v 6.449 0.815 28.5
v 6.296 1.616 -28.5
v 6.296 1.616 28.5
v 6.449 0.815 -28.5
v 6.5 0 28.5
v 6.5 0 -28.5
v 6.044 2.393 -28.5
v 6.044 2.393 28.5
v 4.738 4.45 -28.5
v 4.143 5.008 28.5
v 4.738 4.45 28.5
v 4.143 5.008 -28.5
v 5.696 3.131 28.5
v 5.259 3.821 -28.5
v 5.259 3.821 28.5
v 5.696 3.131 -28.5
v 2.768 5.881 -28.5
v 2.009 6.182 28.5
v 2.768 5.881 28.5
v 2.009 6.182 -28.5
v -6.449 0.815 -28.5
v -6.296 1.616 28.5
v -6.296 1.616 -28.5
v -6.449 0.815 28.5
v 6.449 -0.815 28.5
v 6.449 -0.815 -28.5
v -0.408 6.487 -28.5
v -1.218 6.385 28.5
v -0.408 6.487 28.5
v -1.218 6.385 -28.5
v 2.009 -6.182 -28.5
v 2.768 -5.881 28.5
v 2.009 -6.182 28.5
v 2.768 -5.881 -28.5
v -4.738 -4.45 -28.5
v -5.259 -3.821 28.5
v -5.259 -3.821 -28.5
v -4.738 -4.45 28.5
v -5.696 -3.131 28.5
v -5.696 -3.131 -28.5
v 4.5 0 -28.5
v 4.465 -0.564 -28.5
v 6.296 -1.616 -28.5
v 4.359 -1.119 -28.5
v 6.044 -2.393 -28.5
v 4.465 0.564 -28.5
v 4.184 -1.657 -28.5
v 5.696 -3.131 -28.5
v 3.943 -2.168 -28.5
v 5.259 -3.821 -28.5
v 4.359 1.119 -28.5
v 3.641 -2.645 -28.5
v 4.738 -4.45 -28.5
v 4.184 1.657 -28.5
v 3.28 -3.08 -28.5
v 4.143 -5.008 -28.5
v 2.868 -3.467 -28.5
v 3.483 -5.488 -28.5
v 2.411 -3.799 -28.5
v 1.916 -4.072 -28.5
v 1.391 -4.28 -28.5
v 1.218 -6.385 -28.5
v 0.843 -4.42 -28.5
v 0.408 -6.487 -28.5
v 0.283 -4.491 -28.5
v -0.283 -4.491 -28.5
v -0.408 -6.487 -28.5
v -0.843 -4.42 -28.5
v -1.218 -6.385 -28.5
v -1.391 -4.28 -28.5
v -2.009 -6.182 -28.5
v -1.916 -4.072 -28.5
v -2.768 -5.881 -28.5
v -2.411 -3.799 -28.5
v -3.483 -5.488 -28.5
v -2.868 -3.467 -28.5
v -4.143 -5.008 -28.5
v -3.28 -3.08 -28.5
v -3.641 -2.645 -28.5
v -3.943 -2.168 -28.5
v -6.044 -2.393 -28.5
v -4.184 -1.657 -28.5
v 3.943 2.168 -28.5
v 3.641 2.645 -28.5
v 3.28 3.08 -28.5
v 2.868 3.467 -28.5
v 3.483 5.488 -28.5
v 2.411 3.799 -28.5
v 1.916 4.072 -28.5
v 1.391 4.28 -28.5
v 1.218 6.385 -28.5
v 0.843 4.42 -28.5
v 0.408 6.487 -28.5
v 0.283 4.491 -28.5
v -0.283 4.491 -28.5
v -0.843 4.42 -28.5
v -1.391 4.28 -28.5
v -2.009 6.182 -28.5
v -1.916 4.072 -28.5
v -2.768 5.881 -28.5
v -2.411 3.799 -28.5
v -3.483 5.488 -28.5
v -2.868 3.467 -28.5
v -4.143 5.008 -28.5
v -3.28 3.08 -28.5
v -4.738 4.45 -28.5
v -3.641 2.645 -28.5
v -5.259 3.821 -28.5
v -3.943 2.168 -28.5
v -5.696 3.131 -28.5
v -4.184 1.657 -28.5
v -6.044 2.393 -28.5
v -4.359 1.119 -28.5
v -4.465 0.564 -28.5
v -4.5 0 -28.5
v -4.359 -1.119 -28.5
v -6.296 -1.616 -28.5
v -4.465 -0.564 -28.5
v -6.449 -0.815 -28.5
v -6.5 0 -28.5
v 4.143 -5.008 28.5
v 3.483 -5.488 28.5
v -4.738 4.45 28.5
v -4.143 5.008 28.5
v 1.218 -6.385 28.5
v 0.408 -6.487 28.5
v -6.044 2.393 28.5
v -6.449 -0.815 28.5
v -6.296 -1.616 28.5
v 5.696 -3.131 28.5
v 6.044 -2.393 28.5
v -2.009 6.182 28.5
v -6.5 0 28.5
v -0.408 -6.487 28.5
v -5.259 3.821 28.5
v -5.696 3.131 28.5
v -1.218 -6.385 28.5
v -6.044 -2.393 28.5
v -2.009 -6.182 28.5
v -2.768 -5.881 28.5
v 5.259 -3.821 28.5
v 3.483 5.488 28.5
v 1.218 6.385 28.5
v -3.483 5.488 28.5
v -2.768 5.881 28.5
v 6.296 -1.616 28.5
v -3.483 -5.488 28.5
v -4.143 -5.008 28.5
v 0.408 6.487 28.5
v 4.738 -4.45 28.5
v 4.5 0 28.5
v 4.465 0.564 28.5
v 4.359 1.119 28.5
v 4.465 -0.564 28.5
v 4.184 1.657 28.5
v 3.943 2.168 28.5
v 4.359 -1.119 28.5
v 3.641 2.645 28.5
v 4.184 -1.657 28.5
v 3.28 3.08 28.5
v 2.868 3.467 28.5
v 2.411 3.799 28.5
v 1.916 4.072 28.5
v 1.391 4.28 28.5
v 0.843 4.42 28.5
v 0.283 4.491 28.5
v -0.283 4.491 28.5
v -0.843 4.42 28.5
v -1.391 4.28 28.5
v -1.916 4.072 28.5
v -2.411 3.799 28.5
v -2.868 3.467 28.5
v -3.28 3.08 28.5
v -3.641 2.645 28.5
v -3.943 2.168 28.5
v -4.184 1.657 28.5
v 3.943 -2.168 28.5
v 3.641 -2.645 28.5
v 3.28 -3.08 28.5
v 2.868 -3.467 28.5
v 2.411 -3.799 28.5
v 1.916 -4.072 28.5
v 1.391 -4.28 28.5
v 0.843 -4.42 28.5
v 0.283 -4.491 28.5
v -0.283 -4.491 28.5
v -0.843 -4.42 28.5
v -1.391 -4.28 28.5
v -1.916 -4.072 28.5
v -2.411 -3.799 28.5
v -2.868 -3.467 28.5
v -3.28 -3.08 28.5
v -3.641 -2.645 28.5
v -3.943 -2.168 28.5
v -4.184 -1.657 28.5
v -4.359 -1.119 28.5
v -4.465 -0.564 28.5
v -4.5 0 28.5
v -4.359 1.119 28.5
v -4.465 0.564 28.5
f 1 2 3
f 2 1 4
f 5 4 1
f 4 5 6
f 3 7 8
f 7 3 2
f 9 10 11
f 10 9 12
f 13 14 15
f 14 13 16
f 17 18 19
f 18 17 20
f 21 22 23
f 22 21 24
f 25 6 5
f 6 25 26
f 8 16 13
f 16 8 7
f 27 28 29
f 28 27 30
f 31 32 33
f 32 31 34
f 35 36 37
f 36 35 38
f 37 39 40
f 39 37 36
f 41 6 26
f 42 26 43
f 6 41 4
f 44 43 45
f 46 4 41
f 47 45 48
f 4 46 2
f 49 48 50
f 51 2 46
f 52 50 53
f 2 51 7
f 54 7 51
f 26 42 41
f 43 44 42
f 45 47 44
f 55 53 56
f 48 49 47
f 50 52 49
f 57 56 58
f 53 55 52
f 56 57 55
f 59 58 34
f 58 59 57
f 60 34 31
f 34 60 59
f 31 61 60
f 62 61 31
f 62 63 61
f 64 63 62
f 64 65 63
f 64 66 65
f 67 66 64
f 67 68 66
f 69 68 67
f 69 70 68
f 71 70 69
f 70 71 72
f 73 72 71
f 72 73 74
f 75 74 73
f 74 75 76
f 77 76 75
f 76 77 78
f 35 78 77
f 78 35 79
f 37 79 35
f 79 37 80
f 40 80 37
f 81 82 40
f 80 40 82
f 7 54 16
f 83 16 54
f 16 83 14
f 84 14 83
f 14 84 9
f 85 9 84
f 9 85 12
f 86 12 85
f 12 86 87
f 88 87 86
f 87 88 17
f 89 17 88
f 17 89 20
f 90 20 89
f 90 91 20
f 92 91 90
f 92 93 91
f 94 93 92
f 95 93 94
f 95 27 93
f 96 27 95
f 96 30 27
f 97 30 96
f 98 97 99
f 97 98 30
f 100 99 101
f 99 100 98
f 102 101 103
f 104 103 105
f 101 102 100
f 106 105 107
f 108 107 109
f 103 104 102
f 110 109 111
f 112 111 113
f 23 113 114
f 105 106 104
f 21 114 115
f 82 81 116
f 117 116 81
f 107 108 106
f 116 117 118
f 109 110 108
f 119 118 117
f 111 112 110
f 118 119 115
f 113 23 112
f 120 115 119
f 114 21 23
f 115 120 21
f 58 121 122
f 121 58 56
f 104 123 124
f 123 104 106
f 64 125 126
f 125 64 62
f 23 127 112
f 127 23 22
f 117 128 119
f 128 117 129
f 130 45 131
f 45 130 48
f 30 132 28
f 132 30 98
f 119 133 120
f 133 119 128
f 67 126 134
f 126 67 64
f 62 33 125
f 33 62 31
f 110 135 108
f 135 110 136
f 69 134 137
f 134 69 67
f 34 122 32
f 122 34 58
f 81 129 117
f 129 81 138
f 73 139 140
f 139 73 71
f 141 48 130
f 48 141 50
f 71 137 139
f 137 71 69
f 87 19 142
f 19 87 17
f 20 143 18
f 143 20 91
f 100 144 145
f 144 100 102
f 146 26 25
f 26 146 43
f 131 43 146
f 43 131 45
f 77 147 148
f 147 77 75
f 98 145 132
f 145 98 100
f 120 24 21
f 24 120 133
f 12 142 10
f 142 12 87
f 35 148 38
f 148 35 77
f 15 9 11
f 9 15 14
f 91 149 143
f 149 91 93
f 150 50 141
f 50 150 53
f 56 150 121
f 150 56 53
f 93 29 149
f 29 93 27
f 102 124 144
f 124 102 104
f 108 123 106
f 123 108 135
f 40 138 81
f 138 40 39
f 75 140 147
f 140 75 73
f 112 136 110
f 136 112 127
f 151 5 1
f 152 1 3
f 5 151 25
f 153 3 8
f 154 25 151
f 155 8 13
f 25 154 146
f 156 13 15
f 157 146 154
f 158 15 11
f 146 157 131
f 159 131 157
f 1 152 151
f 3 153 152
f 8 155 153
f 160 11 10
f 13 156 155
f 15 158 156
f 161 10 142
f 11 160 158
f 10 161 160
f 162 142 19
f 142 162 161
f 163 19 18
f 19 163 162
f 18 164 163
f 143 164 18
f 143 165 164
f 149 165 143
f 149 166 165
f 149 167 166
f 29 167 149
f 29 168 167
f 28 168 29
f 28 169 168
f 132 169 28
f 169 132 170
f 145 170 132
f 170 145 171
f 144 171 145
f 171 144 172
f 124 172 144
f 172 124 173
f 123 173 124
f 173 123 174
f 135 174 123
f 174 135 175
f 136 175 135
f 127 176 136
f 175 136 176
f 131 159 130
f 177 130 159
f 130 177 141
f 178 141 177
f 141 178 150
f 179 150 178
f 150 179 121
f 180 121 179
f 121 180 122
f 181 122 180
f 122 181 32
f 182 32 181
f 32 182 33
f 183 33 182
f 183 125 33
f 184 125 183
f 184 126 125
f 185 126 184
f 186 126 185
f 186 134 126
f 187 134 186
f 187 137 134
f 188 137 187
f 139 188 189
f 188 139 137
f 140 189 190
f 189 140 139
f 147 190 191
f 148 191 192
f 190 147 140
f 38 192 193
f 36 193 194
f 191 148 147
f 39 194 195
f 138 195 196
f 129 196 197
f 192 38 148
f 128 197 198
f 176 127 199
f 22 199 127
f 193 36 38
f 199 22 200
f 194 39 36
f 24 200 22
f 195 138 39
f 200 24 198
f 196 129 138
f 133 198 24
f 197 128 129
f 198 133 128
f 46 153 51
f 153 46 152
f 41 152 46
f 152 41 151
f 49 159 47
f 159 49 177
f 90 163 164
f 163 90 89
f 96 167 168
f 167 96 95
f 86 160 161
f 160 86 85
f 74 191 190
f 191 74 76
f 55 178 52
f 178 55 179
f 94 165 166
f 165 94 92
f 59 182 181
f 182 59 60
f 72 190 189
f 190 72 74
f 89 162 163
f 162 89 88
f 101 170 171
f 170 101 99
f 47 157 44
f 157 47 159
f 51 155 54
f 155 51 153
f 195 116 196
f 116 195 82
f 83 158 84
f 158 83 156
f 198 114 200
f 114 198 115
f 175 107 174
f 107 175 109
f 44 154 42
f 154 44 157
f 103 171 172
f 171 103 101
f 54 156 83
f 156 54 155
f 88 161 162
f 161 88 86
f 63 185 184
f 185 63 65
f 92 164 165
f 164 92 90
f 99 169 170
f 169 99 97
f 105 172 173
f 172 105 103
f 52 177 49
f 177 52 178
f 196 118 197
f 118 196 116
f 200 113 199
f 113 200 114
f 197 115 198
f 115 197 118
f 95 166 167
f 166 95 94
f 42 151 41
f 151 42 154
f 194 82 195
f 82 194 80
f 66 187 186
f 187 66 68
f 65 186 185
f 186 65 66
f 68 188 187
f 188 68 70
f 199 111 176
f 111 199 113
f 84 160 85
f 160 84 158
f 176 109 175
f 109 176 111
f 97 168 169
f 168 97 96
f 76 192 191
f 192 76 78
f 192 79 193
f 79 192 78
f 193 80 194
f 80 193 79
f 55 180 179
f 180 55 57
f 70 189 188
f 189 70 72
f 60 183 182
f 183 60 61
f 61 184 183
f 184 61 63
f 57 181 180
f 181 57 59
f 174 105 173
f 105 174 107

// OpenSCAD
$fn = 50;


difference() {
	union() {
		translate(v = [0, 0, -28.5000000000]) {
			cylinder(h = 57, r = 6.5000000000);
		}
	}
	union() {
		translate(v = [0, 0, -100.0000000000]) {
			cylinder(h = 200, r = 4.5000000000);
		}
	}
}
